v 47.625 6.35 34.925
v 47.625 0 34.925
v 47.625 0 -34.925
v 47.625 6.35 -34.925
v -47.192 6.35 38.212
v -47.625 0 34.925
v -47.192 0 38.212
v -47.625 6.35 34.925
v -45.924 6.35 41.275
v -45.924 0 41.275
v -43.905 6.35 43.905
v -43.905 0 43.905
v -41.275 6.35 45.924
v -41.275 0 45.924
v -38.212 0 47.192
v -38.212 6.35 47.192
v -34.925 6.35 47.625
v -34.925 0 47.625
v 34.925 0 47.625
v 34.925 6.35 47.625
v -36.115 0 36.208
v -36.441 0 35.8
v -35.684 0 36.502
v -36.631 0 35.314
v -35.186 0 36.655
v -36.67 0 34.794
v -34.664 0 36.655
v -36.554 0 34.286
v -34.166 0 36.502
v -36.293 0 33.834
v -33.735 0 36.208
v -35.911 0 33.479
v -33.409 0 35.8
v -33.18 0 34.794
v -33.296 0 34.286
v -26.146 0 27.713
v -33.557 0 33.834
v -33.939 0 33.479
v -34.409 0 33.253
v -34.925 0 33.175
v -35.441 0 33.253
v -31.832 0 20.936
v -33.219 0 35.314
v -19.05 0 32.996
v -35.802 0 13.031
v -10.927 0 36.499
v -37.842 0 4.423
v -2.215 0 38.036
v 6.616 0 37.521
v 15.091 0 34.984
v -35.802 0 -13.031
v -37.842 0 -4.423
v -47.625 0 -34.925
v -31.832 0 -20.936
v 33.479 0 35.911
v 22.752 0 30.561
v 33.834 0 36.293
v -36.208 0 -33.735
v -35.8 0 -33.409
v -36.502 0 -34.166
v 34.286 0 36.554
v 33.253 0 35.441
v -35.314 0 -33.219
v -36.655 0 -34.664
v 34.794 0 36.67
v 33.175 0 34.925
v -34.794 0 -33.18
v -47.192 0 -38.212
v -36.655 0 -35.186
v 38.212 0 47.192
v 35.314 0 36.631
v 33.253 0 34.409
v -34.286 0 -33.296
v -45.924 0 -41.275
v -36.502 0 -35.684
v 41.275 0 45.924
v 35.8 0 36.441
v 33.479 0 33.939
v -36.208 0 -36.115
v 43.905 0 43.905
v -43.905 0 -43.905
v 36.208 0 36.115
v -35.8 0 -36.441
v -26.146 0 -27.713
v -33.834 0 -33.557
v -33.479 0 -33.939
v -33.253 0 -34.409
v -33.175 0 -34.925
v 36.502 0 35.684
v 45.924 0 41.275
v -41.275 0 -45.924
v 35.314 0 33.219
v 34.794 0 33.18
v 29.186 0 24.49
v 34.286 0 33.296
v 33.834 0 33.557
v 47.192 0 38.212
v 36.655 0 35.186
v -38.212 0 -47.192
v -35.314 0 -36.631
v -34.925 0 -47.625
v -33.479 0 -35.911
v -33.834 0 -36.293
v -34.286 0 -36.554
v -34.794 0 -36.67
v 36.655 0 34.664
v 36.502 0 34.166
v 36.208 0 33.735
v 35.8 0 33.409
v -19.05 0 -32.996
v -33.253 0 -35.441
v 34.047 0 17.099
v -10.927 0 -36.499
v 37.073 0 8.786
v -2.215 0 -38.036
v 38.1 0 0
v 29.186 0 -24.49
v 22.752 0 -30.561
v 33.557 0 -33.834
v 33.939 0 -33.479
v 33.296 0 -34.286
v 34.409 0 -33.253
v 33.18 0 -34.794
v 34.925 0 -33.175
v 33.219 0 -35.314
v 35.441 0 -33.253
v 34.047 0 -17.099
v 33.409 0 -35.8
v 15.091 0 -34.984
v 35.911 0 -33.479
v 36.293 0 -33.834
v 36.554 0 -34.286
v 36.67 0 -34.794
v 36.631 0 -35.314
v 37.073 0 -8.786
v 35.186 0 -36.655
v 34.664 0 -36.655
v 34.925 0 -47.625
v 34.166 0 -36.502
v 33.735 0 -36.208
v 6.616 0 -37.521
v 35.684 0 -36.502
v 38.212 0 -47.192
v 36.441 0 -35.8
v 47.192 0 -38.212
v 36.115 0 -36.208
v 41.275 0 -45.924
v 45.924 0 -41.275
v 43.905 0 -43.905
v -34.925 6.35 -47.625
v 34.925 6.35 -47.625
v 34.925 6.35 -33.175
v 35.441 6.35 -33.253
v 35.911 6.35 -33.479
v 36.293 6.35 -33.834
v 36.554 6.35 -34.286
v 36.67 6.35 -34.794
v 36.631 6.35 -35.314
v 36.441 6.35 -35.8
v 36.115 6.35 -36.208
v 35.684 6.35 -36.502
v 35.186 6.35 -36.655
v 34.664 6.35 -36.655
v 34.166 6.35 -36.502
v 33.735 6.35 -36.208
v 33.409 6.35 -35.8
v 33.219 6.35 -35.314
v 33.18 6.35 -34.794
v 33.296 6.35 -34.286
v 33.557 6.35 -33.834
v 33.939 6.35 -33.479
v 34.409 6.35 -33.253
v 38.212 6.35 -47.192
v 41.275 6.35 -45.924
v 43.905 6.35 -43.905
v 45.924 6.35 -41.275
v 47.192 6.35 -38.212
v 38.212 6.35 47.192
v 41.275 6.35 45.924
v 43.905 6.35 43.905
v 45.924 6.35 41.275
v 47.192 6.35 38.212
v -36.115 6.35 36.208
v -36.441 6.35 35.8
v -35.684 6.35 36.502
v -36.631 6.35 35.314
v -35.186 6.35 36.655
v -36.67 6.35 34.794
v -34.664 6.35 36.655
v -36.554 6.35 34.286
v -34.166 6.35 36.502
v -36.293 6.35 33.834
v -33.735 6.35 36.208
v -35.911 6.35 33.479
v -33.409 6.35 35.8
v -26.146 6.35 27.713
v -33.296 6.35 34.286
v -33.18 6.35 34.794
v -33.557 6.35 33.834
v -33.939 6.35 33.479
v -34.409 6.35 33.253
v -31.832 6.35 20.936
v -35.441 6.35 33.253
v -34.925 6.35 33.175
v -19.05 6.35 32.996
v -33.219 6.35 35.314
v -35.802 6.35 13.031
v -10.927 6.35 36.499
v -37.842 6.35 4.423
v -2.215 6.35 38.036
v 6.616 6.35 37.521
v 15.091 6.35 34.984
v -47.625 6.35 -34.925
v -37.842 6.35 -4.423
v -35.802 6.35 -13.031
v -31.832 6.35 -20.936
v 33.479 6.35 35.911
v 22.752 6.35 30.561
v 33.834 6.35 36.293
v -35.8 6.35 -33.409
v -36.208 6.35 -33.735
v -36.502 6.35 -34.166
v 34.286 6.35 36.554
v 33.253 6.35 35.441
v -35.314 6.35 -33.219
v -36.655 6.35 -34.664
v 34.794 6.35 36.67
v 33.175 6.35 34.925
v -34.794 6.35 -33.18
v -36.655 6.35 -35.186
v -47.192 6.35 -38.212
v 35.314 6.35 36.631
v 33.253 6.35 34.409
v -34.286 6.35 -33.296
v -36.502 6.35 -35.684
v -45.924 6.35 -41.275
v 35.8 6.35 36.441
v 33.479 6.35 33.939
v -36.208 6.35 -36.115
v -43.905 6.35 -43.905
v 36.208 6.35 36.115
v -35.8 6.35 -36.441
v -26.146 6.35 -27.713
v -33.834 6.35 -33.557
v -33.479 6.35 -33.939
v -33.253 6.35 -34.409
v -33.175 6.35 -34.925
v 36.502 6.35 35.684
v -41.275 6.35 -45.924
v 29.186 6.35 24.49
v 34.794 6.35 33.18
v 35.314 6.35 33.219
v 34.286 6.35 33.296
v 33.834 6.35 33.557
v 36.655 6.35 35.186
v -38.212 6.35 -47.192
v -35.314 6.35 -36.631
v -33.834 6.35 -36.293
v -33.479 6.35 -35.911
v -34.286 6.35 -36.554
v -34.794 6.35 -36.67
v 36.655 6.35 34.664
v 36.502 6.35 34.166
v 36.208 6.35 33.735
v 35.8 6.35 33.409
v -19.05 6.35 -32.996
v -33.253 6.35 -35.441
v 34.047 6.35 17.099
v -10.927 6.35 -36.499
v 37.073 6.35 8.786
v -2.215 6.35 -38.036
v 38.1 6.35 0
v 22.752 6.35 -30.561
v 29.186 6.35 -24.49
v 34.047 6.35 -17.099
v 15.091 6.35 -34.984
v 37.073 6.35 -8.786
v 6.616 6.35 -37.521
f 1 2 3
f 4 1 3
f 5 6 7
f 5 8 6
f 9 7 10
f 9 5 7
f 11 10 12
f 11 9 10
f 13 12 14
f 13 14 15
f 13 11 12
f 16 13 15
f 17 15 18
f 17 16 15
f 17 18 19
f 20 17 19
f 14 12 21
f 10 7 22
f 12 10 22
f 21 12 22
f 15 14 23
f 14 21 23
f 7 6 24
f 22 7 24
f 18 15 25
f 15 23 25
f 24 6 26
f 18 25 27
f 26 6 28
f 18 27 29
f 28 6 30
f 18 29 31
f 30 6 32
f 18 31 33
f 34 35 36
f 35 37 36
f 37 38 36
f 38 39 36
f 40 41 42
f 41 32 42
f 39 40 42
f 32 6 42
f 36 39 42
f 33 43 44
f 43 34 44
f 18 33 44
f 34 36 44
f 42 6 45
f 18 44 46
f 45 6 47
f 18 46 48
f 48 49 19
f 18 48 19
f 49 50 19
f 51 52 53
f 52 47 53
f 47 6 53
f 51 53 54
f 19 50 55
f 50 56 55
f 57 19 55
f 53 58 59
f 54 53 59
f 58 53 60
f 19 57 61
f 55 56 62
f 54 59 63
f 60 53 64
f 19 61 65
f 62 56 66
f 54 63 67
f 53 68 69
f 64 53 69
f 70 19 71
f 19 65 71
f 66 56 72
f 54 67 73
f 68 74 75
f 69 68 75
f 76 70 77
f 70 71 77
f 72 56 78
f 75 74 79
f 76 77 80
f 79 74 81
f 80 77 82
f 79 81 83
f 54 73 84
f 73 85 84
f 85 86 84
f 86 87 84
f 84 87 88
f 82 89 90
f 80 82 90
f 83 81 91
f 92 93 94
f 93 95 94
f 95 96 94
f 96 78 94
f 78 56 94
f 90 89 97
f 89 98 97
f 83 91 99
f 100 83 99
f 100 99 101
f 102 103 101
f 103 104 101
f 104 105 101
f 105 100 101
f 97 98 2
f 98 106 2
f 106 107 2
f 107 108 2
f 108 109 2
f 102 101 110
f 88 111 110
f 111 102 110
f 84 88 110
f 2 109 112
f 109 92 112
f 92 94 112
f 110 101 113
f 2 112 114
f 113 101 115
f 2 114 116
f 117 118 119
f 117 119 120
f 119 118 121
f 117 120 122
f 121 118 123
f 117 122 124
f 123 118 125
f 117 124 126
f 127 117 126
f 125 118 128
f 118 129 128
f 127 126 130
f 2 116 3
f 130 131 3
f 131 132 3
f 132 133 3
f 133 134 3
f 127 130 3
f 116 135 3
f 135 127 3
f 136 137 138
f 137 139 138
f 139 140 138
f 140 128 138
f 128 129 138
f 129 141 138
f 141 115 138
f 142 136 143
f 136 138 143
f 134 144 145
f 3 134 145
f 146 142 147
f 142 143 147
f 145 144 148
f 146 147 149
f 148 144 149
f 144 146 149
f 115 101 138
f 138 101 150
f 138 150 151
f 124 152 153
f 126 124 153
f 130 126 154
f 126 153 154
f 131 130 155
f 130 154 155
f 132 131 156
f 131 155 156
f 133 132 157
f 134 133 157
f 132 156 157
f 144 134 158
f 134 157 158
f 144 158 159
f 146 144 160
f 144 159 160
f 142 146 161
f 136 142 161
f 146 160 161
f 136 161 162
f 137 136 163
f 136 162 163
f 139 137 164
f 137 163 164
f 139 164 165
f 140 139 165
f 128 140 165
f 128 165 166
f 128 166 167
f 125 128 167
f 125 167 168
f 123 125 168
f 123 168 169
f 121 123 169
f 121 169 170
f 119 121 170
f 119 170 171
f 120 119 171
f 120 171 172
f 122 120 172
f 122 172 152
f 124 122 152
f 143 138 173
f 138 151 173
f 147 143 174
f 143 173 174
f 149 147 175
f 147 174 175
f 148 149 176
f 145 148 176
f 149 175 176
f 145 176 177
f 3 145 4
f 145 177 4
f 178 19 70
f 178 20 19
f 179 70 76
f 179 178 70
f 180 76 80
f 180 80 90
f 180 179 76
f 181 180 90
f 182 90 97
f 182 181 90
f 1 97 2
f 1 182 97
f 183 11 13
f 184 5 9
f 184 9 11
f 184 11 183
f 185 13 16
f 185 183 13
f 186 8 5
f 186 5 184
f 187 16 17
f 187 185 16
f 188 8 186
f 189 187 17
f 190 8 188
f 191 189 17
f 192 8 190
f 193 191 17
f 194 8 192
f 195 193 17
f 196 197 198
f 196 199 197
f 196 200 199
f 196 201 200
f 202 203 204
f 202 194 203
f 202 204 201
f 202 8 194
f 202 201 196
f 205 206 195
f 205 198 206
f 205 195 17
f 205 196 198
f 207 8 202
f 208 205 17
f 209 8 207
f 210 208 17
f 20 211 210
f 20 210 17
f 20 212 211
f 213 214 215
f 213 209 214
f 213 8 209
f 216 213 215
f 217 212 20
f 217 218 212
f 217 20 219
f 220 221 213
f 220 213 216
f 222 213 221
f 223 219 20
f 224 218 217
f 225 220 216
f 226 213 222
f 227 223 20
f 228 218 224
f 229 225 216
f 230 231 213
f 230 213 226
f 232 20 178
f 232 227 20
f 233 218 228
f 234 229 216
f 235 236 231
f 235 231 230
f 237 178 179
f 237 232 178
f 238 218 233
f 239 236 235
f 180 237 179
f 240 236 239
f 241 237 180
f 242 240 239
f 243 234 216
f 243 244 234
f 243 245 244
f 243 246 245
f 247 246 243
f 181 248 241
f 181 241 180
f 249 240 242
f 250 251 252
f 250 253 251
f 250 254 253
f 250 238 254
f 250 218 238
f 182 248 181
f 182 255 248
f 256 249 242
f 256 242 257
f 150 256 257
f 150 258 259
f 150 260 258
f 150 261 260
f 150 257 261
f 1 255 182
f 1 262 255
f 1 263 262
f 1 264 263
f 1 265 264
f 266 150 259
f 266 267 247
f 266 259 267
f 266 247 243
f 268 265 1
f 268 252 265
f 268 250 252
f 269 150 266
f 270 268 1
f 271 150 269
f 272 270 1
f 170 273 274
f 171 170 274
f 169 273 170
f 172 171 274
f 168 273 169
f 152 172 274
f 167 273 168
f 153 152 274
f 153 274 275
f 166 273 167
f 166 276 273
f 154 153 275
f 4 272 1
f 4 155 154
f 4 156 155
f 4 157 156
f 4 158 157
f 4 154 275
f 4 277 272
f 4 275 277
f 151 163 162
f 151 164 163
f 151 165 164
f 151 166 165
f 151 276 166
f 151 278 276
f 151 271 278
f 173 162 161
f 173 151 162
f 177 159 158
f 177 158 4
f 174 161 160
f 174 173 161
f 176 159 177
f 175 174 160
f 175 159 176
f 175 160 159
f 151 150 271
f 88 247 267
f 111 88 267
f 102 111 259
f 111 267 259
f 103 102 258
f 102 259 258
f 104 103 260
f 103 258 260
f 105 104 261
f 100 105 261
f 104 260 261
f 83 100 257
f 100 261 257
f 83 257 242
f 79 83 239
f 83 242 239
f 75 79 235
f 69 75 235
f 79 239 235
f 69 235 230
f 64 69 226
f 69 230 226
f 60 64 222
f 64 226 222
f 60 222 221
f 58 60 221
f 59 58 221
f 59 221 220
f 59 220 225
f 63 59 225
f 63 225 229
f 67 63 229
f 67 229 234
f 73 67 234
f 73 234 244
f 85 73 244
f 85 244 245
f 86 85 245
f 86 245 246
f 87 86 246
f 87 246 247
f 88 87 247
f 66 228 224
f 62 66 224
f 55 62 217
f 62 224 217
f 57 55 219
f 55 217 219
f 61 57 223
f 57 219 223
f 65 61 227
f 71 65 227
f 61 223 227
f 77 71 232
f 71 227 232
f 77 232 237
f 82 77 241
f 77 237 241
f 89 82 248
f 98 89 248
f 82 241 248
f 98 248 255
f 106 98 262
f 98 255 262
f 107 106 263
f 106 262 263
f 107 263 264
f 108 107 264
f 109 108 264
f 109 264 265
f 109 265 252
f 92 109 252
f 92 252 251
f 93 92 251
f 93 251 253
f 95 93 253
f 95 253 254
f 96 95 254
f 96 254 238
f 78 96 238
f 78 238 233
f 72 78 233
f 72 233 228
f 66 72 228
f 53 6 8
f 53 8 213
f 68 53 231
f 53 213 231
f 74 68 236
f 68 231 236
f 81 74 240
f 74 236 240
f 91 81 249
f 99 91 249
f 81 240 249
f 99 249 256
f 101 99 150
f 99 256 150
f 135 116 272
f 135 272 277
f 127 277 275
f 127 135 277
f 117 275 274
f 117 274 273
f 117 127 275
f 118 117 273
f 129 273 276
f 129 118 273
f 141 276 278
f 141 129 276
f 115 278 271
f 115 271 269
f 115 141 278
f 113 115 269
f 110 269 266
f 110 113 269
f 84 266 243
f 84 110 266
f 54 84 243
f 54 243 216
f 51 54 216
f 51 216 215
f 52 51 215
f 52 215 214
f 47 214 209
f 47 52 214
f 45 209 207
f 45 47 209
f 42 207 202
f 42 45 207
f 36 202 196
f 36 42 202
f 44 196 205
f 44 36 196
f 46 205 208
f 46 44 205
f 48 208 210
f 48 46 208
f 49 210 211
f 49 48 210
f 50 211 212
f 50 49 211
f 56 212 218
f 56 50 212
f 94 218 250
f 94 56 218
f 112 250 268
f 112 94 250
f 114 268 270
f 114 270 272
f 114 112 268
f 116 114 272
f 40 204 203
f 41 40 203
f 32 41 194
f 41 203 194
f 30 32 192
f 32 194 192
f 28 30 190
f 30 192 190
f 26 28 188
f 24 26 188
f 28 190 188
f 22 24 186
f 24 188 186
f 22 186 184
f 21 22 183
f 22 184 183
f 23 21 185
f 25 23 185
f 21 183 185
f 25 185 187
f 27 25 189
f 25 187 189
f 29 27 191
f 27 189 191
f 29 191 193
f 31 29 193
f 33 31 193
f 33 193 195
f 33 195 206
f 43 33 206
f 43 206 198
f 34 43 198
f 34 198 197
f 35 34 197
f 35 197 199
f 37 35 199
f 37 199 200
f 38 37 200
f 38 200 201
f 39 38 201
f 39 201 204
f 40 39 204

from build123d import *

# Parameters (mm, degrees)
SKETCH1_W           = 95.25
SKETCH1_H           = 95.25
SKETCH1_R           = 38.1
BOSS_EXTRUDE1_DEPTH = 6.35
SKETCH2_R           = 1.75
CUT_EXTRUDE1_DEPTH  = 7.35
CIRPATTERN1_COUNT   = 4
FILLET1_R           = 12.7


with BuildPart() as part:
    # Sketch1 → Boss-Extrude1 (new body)
    with BuildSketch(Plane(origin=(0, 0, 0), x_dir=(1, 0, 0), z_dir=(0, 1, 0))):
        Rectangle(SKETCH1_W, SKETCH1_H)
        Circle(SKETCH1_R, mode=Mode.SUBTRACT)
    extrude(amount=BOSS_EXTRUDE1_DEPTH)

    # Sketch2 → Cut-Extrude1 (cut, through all)
    with BuildSketch(Plane(origin=(0, 6.35, 0), x_dir=(1, 0, 0), z_dir=(0, 1, 0))):
        with Locations((-34.925, 34.925)):
            Circle(SKETCH2_R)
    cut_extrude1 = extrude(amount=-CUT_EXTRUDE1_DEPTH, mode=Mode.SUBTRACT)

    # CirPattern1: Cut-Extrude1 ×4 about axis
    cirpattern1_axis = Axis((0, 0, 0), (0, 1, 0))
    for i in range(1, CIRPATTERN1_COUNT):
        add(cut_extrude1.rotate(cirpattern1_axis, i * 360 / CIRPATTERN1_COUNT), mode=Mode.SUBTRACT)

    # Fillet1
    fillet1_edges = [part.edges().sort_by_distance(p)[0] for p in [
        (-47.625, 3.175, -47.625),
        (47.625, 3.175, -47.625),
        (47.625, 3.175, 47.625),
        (-47.625, 3.175, 47.625),
    ]]
    fillet(fillet1_edges, radius=FILLET1_R)


solid = part.part
